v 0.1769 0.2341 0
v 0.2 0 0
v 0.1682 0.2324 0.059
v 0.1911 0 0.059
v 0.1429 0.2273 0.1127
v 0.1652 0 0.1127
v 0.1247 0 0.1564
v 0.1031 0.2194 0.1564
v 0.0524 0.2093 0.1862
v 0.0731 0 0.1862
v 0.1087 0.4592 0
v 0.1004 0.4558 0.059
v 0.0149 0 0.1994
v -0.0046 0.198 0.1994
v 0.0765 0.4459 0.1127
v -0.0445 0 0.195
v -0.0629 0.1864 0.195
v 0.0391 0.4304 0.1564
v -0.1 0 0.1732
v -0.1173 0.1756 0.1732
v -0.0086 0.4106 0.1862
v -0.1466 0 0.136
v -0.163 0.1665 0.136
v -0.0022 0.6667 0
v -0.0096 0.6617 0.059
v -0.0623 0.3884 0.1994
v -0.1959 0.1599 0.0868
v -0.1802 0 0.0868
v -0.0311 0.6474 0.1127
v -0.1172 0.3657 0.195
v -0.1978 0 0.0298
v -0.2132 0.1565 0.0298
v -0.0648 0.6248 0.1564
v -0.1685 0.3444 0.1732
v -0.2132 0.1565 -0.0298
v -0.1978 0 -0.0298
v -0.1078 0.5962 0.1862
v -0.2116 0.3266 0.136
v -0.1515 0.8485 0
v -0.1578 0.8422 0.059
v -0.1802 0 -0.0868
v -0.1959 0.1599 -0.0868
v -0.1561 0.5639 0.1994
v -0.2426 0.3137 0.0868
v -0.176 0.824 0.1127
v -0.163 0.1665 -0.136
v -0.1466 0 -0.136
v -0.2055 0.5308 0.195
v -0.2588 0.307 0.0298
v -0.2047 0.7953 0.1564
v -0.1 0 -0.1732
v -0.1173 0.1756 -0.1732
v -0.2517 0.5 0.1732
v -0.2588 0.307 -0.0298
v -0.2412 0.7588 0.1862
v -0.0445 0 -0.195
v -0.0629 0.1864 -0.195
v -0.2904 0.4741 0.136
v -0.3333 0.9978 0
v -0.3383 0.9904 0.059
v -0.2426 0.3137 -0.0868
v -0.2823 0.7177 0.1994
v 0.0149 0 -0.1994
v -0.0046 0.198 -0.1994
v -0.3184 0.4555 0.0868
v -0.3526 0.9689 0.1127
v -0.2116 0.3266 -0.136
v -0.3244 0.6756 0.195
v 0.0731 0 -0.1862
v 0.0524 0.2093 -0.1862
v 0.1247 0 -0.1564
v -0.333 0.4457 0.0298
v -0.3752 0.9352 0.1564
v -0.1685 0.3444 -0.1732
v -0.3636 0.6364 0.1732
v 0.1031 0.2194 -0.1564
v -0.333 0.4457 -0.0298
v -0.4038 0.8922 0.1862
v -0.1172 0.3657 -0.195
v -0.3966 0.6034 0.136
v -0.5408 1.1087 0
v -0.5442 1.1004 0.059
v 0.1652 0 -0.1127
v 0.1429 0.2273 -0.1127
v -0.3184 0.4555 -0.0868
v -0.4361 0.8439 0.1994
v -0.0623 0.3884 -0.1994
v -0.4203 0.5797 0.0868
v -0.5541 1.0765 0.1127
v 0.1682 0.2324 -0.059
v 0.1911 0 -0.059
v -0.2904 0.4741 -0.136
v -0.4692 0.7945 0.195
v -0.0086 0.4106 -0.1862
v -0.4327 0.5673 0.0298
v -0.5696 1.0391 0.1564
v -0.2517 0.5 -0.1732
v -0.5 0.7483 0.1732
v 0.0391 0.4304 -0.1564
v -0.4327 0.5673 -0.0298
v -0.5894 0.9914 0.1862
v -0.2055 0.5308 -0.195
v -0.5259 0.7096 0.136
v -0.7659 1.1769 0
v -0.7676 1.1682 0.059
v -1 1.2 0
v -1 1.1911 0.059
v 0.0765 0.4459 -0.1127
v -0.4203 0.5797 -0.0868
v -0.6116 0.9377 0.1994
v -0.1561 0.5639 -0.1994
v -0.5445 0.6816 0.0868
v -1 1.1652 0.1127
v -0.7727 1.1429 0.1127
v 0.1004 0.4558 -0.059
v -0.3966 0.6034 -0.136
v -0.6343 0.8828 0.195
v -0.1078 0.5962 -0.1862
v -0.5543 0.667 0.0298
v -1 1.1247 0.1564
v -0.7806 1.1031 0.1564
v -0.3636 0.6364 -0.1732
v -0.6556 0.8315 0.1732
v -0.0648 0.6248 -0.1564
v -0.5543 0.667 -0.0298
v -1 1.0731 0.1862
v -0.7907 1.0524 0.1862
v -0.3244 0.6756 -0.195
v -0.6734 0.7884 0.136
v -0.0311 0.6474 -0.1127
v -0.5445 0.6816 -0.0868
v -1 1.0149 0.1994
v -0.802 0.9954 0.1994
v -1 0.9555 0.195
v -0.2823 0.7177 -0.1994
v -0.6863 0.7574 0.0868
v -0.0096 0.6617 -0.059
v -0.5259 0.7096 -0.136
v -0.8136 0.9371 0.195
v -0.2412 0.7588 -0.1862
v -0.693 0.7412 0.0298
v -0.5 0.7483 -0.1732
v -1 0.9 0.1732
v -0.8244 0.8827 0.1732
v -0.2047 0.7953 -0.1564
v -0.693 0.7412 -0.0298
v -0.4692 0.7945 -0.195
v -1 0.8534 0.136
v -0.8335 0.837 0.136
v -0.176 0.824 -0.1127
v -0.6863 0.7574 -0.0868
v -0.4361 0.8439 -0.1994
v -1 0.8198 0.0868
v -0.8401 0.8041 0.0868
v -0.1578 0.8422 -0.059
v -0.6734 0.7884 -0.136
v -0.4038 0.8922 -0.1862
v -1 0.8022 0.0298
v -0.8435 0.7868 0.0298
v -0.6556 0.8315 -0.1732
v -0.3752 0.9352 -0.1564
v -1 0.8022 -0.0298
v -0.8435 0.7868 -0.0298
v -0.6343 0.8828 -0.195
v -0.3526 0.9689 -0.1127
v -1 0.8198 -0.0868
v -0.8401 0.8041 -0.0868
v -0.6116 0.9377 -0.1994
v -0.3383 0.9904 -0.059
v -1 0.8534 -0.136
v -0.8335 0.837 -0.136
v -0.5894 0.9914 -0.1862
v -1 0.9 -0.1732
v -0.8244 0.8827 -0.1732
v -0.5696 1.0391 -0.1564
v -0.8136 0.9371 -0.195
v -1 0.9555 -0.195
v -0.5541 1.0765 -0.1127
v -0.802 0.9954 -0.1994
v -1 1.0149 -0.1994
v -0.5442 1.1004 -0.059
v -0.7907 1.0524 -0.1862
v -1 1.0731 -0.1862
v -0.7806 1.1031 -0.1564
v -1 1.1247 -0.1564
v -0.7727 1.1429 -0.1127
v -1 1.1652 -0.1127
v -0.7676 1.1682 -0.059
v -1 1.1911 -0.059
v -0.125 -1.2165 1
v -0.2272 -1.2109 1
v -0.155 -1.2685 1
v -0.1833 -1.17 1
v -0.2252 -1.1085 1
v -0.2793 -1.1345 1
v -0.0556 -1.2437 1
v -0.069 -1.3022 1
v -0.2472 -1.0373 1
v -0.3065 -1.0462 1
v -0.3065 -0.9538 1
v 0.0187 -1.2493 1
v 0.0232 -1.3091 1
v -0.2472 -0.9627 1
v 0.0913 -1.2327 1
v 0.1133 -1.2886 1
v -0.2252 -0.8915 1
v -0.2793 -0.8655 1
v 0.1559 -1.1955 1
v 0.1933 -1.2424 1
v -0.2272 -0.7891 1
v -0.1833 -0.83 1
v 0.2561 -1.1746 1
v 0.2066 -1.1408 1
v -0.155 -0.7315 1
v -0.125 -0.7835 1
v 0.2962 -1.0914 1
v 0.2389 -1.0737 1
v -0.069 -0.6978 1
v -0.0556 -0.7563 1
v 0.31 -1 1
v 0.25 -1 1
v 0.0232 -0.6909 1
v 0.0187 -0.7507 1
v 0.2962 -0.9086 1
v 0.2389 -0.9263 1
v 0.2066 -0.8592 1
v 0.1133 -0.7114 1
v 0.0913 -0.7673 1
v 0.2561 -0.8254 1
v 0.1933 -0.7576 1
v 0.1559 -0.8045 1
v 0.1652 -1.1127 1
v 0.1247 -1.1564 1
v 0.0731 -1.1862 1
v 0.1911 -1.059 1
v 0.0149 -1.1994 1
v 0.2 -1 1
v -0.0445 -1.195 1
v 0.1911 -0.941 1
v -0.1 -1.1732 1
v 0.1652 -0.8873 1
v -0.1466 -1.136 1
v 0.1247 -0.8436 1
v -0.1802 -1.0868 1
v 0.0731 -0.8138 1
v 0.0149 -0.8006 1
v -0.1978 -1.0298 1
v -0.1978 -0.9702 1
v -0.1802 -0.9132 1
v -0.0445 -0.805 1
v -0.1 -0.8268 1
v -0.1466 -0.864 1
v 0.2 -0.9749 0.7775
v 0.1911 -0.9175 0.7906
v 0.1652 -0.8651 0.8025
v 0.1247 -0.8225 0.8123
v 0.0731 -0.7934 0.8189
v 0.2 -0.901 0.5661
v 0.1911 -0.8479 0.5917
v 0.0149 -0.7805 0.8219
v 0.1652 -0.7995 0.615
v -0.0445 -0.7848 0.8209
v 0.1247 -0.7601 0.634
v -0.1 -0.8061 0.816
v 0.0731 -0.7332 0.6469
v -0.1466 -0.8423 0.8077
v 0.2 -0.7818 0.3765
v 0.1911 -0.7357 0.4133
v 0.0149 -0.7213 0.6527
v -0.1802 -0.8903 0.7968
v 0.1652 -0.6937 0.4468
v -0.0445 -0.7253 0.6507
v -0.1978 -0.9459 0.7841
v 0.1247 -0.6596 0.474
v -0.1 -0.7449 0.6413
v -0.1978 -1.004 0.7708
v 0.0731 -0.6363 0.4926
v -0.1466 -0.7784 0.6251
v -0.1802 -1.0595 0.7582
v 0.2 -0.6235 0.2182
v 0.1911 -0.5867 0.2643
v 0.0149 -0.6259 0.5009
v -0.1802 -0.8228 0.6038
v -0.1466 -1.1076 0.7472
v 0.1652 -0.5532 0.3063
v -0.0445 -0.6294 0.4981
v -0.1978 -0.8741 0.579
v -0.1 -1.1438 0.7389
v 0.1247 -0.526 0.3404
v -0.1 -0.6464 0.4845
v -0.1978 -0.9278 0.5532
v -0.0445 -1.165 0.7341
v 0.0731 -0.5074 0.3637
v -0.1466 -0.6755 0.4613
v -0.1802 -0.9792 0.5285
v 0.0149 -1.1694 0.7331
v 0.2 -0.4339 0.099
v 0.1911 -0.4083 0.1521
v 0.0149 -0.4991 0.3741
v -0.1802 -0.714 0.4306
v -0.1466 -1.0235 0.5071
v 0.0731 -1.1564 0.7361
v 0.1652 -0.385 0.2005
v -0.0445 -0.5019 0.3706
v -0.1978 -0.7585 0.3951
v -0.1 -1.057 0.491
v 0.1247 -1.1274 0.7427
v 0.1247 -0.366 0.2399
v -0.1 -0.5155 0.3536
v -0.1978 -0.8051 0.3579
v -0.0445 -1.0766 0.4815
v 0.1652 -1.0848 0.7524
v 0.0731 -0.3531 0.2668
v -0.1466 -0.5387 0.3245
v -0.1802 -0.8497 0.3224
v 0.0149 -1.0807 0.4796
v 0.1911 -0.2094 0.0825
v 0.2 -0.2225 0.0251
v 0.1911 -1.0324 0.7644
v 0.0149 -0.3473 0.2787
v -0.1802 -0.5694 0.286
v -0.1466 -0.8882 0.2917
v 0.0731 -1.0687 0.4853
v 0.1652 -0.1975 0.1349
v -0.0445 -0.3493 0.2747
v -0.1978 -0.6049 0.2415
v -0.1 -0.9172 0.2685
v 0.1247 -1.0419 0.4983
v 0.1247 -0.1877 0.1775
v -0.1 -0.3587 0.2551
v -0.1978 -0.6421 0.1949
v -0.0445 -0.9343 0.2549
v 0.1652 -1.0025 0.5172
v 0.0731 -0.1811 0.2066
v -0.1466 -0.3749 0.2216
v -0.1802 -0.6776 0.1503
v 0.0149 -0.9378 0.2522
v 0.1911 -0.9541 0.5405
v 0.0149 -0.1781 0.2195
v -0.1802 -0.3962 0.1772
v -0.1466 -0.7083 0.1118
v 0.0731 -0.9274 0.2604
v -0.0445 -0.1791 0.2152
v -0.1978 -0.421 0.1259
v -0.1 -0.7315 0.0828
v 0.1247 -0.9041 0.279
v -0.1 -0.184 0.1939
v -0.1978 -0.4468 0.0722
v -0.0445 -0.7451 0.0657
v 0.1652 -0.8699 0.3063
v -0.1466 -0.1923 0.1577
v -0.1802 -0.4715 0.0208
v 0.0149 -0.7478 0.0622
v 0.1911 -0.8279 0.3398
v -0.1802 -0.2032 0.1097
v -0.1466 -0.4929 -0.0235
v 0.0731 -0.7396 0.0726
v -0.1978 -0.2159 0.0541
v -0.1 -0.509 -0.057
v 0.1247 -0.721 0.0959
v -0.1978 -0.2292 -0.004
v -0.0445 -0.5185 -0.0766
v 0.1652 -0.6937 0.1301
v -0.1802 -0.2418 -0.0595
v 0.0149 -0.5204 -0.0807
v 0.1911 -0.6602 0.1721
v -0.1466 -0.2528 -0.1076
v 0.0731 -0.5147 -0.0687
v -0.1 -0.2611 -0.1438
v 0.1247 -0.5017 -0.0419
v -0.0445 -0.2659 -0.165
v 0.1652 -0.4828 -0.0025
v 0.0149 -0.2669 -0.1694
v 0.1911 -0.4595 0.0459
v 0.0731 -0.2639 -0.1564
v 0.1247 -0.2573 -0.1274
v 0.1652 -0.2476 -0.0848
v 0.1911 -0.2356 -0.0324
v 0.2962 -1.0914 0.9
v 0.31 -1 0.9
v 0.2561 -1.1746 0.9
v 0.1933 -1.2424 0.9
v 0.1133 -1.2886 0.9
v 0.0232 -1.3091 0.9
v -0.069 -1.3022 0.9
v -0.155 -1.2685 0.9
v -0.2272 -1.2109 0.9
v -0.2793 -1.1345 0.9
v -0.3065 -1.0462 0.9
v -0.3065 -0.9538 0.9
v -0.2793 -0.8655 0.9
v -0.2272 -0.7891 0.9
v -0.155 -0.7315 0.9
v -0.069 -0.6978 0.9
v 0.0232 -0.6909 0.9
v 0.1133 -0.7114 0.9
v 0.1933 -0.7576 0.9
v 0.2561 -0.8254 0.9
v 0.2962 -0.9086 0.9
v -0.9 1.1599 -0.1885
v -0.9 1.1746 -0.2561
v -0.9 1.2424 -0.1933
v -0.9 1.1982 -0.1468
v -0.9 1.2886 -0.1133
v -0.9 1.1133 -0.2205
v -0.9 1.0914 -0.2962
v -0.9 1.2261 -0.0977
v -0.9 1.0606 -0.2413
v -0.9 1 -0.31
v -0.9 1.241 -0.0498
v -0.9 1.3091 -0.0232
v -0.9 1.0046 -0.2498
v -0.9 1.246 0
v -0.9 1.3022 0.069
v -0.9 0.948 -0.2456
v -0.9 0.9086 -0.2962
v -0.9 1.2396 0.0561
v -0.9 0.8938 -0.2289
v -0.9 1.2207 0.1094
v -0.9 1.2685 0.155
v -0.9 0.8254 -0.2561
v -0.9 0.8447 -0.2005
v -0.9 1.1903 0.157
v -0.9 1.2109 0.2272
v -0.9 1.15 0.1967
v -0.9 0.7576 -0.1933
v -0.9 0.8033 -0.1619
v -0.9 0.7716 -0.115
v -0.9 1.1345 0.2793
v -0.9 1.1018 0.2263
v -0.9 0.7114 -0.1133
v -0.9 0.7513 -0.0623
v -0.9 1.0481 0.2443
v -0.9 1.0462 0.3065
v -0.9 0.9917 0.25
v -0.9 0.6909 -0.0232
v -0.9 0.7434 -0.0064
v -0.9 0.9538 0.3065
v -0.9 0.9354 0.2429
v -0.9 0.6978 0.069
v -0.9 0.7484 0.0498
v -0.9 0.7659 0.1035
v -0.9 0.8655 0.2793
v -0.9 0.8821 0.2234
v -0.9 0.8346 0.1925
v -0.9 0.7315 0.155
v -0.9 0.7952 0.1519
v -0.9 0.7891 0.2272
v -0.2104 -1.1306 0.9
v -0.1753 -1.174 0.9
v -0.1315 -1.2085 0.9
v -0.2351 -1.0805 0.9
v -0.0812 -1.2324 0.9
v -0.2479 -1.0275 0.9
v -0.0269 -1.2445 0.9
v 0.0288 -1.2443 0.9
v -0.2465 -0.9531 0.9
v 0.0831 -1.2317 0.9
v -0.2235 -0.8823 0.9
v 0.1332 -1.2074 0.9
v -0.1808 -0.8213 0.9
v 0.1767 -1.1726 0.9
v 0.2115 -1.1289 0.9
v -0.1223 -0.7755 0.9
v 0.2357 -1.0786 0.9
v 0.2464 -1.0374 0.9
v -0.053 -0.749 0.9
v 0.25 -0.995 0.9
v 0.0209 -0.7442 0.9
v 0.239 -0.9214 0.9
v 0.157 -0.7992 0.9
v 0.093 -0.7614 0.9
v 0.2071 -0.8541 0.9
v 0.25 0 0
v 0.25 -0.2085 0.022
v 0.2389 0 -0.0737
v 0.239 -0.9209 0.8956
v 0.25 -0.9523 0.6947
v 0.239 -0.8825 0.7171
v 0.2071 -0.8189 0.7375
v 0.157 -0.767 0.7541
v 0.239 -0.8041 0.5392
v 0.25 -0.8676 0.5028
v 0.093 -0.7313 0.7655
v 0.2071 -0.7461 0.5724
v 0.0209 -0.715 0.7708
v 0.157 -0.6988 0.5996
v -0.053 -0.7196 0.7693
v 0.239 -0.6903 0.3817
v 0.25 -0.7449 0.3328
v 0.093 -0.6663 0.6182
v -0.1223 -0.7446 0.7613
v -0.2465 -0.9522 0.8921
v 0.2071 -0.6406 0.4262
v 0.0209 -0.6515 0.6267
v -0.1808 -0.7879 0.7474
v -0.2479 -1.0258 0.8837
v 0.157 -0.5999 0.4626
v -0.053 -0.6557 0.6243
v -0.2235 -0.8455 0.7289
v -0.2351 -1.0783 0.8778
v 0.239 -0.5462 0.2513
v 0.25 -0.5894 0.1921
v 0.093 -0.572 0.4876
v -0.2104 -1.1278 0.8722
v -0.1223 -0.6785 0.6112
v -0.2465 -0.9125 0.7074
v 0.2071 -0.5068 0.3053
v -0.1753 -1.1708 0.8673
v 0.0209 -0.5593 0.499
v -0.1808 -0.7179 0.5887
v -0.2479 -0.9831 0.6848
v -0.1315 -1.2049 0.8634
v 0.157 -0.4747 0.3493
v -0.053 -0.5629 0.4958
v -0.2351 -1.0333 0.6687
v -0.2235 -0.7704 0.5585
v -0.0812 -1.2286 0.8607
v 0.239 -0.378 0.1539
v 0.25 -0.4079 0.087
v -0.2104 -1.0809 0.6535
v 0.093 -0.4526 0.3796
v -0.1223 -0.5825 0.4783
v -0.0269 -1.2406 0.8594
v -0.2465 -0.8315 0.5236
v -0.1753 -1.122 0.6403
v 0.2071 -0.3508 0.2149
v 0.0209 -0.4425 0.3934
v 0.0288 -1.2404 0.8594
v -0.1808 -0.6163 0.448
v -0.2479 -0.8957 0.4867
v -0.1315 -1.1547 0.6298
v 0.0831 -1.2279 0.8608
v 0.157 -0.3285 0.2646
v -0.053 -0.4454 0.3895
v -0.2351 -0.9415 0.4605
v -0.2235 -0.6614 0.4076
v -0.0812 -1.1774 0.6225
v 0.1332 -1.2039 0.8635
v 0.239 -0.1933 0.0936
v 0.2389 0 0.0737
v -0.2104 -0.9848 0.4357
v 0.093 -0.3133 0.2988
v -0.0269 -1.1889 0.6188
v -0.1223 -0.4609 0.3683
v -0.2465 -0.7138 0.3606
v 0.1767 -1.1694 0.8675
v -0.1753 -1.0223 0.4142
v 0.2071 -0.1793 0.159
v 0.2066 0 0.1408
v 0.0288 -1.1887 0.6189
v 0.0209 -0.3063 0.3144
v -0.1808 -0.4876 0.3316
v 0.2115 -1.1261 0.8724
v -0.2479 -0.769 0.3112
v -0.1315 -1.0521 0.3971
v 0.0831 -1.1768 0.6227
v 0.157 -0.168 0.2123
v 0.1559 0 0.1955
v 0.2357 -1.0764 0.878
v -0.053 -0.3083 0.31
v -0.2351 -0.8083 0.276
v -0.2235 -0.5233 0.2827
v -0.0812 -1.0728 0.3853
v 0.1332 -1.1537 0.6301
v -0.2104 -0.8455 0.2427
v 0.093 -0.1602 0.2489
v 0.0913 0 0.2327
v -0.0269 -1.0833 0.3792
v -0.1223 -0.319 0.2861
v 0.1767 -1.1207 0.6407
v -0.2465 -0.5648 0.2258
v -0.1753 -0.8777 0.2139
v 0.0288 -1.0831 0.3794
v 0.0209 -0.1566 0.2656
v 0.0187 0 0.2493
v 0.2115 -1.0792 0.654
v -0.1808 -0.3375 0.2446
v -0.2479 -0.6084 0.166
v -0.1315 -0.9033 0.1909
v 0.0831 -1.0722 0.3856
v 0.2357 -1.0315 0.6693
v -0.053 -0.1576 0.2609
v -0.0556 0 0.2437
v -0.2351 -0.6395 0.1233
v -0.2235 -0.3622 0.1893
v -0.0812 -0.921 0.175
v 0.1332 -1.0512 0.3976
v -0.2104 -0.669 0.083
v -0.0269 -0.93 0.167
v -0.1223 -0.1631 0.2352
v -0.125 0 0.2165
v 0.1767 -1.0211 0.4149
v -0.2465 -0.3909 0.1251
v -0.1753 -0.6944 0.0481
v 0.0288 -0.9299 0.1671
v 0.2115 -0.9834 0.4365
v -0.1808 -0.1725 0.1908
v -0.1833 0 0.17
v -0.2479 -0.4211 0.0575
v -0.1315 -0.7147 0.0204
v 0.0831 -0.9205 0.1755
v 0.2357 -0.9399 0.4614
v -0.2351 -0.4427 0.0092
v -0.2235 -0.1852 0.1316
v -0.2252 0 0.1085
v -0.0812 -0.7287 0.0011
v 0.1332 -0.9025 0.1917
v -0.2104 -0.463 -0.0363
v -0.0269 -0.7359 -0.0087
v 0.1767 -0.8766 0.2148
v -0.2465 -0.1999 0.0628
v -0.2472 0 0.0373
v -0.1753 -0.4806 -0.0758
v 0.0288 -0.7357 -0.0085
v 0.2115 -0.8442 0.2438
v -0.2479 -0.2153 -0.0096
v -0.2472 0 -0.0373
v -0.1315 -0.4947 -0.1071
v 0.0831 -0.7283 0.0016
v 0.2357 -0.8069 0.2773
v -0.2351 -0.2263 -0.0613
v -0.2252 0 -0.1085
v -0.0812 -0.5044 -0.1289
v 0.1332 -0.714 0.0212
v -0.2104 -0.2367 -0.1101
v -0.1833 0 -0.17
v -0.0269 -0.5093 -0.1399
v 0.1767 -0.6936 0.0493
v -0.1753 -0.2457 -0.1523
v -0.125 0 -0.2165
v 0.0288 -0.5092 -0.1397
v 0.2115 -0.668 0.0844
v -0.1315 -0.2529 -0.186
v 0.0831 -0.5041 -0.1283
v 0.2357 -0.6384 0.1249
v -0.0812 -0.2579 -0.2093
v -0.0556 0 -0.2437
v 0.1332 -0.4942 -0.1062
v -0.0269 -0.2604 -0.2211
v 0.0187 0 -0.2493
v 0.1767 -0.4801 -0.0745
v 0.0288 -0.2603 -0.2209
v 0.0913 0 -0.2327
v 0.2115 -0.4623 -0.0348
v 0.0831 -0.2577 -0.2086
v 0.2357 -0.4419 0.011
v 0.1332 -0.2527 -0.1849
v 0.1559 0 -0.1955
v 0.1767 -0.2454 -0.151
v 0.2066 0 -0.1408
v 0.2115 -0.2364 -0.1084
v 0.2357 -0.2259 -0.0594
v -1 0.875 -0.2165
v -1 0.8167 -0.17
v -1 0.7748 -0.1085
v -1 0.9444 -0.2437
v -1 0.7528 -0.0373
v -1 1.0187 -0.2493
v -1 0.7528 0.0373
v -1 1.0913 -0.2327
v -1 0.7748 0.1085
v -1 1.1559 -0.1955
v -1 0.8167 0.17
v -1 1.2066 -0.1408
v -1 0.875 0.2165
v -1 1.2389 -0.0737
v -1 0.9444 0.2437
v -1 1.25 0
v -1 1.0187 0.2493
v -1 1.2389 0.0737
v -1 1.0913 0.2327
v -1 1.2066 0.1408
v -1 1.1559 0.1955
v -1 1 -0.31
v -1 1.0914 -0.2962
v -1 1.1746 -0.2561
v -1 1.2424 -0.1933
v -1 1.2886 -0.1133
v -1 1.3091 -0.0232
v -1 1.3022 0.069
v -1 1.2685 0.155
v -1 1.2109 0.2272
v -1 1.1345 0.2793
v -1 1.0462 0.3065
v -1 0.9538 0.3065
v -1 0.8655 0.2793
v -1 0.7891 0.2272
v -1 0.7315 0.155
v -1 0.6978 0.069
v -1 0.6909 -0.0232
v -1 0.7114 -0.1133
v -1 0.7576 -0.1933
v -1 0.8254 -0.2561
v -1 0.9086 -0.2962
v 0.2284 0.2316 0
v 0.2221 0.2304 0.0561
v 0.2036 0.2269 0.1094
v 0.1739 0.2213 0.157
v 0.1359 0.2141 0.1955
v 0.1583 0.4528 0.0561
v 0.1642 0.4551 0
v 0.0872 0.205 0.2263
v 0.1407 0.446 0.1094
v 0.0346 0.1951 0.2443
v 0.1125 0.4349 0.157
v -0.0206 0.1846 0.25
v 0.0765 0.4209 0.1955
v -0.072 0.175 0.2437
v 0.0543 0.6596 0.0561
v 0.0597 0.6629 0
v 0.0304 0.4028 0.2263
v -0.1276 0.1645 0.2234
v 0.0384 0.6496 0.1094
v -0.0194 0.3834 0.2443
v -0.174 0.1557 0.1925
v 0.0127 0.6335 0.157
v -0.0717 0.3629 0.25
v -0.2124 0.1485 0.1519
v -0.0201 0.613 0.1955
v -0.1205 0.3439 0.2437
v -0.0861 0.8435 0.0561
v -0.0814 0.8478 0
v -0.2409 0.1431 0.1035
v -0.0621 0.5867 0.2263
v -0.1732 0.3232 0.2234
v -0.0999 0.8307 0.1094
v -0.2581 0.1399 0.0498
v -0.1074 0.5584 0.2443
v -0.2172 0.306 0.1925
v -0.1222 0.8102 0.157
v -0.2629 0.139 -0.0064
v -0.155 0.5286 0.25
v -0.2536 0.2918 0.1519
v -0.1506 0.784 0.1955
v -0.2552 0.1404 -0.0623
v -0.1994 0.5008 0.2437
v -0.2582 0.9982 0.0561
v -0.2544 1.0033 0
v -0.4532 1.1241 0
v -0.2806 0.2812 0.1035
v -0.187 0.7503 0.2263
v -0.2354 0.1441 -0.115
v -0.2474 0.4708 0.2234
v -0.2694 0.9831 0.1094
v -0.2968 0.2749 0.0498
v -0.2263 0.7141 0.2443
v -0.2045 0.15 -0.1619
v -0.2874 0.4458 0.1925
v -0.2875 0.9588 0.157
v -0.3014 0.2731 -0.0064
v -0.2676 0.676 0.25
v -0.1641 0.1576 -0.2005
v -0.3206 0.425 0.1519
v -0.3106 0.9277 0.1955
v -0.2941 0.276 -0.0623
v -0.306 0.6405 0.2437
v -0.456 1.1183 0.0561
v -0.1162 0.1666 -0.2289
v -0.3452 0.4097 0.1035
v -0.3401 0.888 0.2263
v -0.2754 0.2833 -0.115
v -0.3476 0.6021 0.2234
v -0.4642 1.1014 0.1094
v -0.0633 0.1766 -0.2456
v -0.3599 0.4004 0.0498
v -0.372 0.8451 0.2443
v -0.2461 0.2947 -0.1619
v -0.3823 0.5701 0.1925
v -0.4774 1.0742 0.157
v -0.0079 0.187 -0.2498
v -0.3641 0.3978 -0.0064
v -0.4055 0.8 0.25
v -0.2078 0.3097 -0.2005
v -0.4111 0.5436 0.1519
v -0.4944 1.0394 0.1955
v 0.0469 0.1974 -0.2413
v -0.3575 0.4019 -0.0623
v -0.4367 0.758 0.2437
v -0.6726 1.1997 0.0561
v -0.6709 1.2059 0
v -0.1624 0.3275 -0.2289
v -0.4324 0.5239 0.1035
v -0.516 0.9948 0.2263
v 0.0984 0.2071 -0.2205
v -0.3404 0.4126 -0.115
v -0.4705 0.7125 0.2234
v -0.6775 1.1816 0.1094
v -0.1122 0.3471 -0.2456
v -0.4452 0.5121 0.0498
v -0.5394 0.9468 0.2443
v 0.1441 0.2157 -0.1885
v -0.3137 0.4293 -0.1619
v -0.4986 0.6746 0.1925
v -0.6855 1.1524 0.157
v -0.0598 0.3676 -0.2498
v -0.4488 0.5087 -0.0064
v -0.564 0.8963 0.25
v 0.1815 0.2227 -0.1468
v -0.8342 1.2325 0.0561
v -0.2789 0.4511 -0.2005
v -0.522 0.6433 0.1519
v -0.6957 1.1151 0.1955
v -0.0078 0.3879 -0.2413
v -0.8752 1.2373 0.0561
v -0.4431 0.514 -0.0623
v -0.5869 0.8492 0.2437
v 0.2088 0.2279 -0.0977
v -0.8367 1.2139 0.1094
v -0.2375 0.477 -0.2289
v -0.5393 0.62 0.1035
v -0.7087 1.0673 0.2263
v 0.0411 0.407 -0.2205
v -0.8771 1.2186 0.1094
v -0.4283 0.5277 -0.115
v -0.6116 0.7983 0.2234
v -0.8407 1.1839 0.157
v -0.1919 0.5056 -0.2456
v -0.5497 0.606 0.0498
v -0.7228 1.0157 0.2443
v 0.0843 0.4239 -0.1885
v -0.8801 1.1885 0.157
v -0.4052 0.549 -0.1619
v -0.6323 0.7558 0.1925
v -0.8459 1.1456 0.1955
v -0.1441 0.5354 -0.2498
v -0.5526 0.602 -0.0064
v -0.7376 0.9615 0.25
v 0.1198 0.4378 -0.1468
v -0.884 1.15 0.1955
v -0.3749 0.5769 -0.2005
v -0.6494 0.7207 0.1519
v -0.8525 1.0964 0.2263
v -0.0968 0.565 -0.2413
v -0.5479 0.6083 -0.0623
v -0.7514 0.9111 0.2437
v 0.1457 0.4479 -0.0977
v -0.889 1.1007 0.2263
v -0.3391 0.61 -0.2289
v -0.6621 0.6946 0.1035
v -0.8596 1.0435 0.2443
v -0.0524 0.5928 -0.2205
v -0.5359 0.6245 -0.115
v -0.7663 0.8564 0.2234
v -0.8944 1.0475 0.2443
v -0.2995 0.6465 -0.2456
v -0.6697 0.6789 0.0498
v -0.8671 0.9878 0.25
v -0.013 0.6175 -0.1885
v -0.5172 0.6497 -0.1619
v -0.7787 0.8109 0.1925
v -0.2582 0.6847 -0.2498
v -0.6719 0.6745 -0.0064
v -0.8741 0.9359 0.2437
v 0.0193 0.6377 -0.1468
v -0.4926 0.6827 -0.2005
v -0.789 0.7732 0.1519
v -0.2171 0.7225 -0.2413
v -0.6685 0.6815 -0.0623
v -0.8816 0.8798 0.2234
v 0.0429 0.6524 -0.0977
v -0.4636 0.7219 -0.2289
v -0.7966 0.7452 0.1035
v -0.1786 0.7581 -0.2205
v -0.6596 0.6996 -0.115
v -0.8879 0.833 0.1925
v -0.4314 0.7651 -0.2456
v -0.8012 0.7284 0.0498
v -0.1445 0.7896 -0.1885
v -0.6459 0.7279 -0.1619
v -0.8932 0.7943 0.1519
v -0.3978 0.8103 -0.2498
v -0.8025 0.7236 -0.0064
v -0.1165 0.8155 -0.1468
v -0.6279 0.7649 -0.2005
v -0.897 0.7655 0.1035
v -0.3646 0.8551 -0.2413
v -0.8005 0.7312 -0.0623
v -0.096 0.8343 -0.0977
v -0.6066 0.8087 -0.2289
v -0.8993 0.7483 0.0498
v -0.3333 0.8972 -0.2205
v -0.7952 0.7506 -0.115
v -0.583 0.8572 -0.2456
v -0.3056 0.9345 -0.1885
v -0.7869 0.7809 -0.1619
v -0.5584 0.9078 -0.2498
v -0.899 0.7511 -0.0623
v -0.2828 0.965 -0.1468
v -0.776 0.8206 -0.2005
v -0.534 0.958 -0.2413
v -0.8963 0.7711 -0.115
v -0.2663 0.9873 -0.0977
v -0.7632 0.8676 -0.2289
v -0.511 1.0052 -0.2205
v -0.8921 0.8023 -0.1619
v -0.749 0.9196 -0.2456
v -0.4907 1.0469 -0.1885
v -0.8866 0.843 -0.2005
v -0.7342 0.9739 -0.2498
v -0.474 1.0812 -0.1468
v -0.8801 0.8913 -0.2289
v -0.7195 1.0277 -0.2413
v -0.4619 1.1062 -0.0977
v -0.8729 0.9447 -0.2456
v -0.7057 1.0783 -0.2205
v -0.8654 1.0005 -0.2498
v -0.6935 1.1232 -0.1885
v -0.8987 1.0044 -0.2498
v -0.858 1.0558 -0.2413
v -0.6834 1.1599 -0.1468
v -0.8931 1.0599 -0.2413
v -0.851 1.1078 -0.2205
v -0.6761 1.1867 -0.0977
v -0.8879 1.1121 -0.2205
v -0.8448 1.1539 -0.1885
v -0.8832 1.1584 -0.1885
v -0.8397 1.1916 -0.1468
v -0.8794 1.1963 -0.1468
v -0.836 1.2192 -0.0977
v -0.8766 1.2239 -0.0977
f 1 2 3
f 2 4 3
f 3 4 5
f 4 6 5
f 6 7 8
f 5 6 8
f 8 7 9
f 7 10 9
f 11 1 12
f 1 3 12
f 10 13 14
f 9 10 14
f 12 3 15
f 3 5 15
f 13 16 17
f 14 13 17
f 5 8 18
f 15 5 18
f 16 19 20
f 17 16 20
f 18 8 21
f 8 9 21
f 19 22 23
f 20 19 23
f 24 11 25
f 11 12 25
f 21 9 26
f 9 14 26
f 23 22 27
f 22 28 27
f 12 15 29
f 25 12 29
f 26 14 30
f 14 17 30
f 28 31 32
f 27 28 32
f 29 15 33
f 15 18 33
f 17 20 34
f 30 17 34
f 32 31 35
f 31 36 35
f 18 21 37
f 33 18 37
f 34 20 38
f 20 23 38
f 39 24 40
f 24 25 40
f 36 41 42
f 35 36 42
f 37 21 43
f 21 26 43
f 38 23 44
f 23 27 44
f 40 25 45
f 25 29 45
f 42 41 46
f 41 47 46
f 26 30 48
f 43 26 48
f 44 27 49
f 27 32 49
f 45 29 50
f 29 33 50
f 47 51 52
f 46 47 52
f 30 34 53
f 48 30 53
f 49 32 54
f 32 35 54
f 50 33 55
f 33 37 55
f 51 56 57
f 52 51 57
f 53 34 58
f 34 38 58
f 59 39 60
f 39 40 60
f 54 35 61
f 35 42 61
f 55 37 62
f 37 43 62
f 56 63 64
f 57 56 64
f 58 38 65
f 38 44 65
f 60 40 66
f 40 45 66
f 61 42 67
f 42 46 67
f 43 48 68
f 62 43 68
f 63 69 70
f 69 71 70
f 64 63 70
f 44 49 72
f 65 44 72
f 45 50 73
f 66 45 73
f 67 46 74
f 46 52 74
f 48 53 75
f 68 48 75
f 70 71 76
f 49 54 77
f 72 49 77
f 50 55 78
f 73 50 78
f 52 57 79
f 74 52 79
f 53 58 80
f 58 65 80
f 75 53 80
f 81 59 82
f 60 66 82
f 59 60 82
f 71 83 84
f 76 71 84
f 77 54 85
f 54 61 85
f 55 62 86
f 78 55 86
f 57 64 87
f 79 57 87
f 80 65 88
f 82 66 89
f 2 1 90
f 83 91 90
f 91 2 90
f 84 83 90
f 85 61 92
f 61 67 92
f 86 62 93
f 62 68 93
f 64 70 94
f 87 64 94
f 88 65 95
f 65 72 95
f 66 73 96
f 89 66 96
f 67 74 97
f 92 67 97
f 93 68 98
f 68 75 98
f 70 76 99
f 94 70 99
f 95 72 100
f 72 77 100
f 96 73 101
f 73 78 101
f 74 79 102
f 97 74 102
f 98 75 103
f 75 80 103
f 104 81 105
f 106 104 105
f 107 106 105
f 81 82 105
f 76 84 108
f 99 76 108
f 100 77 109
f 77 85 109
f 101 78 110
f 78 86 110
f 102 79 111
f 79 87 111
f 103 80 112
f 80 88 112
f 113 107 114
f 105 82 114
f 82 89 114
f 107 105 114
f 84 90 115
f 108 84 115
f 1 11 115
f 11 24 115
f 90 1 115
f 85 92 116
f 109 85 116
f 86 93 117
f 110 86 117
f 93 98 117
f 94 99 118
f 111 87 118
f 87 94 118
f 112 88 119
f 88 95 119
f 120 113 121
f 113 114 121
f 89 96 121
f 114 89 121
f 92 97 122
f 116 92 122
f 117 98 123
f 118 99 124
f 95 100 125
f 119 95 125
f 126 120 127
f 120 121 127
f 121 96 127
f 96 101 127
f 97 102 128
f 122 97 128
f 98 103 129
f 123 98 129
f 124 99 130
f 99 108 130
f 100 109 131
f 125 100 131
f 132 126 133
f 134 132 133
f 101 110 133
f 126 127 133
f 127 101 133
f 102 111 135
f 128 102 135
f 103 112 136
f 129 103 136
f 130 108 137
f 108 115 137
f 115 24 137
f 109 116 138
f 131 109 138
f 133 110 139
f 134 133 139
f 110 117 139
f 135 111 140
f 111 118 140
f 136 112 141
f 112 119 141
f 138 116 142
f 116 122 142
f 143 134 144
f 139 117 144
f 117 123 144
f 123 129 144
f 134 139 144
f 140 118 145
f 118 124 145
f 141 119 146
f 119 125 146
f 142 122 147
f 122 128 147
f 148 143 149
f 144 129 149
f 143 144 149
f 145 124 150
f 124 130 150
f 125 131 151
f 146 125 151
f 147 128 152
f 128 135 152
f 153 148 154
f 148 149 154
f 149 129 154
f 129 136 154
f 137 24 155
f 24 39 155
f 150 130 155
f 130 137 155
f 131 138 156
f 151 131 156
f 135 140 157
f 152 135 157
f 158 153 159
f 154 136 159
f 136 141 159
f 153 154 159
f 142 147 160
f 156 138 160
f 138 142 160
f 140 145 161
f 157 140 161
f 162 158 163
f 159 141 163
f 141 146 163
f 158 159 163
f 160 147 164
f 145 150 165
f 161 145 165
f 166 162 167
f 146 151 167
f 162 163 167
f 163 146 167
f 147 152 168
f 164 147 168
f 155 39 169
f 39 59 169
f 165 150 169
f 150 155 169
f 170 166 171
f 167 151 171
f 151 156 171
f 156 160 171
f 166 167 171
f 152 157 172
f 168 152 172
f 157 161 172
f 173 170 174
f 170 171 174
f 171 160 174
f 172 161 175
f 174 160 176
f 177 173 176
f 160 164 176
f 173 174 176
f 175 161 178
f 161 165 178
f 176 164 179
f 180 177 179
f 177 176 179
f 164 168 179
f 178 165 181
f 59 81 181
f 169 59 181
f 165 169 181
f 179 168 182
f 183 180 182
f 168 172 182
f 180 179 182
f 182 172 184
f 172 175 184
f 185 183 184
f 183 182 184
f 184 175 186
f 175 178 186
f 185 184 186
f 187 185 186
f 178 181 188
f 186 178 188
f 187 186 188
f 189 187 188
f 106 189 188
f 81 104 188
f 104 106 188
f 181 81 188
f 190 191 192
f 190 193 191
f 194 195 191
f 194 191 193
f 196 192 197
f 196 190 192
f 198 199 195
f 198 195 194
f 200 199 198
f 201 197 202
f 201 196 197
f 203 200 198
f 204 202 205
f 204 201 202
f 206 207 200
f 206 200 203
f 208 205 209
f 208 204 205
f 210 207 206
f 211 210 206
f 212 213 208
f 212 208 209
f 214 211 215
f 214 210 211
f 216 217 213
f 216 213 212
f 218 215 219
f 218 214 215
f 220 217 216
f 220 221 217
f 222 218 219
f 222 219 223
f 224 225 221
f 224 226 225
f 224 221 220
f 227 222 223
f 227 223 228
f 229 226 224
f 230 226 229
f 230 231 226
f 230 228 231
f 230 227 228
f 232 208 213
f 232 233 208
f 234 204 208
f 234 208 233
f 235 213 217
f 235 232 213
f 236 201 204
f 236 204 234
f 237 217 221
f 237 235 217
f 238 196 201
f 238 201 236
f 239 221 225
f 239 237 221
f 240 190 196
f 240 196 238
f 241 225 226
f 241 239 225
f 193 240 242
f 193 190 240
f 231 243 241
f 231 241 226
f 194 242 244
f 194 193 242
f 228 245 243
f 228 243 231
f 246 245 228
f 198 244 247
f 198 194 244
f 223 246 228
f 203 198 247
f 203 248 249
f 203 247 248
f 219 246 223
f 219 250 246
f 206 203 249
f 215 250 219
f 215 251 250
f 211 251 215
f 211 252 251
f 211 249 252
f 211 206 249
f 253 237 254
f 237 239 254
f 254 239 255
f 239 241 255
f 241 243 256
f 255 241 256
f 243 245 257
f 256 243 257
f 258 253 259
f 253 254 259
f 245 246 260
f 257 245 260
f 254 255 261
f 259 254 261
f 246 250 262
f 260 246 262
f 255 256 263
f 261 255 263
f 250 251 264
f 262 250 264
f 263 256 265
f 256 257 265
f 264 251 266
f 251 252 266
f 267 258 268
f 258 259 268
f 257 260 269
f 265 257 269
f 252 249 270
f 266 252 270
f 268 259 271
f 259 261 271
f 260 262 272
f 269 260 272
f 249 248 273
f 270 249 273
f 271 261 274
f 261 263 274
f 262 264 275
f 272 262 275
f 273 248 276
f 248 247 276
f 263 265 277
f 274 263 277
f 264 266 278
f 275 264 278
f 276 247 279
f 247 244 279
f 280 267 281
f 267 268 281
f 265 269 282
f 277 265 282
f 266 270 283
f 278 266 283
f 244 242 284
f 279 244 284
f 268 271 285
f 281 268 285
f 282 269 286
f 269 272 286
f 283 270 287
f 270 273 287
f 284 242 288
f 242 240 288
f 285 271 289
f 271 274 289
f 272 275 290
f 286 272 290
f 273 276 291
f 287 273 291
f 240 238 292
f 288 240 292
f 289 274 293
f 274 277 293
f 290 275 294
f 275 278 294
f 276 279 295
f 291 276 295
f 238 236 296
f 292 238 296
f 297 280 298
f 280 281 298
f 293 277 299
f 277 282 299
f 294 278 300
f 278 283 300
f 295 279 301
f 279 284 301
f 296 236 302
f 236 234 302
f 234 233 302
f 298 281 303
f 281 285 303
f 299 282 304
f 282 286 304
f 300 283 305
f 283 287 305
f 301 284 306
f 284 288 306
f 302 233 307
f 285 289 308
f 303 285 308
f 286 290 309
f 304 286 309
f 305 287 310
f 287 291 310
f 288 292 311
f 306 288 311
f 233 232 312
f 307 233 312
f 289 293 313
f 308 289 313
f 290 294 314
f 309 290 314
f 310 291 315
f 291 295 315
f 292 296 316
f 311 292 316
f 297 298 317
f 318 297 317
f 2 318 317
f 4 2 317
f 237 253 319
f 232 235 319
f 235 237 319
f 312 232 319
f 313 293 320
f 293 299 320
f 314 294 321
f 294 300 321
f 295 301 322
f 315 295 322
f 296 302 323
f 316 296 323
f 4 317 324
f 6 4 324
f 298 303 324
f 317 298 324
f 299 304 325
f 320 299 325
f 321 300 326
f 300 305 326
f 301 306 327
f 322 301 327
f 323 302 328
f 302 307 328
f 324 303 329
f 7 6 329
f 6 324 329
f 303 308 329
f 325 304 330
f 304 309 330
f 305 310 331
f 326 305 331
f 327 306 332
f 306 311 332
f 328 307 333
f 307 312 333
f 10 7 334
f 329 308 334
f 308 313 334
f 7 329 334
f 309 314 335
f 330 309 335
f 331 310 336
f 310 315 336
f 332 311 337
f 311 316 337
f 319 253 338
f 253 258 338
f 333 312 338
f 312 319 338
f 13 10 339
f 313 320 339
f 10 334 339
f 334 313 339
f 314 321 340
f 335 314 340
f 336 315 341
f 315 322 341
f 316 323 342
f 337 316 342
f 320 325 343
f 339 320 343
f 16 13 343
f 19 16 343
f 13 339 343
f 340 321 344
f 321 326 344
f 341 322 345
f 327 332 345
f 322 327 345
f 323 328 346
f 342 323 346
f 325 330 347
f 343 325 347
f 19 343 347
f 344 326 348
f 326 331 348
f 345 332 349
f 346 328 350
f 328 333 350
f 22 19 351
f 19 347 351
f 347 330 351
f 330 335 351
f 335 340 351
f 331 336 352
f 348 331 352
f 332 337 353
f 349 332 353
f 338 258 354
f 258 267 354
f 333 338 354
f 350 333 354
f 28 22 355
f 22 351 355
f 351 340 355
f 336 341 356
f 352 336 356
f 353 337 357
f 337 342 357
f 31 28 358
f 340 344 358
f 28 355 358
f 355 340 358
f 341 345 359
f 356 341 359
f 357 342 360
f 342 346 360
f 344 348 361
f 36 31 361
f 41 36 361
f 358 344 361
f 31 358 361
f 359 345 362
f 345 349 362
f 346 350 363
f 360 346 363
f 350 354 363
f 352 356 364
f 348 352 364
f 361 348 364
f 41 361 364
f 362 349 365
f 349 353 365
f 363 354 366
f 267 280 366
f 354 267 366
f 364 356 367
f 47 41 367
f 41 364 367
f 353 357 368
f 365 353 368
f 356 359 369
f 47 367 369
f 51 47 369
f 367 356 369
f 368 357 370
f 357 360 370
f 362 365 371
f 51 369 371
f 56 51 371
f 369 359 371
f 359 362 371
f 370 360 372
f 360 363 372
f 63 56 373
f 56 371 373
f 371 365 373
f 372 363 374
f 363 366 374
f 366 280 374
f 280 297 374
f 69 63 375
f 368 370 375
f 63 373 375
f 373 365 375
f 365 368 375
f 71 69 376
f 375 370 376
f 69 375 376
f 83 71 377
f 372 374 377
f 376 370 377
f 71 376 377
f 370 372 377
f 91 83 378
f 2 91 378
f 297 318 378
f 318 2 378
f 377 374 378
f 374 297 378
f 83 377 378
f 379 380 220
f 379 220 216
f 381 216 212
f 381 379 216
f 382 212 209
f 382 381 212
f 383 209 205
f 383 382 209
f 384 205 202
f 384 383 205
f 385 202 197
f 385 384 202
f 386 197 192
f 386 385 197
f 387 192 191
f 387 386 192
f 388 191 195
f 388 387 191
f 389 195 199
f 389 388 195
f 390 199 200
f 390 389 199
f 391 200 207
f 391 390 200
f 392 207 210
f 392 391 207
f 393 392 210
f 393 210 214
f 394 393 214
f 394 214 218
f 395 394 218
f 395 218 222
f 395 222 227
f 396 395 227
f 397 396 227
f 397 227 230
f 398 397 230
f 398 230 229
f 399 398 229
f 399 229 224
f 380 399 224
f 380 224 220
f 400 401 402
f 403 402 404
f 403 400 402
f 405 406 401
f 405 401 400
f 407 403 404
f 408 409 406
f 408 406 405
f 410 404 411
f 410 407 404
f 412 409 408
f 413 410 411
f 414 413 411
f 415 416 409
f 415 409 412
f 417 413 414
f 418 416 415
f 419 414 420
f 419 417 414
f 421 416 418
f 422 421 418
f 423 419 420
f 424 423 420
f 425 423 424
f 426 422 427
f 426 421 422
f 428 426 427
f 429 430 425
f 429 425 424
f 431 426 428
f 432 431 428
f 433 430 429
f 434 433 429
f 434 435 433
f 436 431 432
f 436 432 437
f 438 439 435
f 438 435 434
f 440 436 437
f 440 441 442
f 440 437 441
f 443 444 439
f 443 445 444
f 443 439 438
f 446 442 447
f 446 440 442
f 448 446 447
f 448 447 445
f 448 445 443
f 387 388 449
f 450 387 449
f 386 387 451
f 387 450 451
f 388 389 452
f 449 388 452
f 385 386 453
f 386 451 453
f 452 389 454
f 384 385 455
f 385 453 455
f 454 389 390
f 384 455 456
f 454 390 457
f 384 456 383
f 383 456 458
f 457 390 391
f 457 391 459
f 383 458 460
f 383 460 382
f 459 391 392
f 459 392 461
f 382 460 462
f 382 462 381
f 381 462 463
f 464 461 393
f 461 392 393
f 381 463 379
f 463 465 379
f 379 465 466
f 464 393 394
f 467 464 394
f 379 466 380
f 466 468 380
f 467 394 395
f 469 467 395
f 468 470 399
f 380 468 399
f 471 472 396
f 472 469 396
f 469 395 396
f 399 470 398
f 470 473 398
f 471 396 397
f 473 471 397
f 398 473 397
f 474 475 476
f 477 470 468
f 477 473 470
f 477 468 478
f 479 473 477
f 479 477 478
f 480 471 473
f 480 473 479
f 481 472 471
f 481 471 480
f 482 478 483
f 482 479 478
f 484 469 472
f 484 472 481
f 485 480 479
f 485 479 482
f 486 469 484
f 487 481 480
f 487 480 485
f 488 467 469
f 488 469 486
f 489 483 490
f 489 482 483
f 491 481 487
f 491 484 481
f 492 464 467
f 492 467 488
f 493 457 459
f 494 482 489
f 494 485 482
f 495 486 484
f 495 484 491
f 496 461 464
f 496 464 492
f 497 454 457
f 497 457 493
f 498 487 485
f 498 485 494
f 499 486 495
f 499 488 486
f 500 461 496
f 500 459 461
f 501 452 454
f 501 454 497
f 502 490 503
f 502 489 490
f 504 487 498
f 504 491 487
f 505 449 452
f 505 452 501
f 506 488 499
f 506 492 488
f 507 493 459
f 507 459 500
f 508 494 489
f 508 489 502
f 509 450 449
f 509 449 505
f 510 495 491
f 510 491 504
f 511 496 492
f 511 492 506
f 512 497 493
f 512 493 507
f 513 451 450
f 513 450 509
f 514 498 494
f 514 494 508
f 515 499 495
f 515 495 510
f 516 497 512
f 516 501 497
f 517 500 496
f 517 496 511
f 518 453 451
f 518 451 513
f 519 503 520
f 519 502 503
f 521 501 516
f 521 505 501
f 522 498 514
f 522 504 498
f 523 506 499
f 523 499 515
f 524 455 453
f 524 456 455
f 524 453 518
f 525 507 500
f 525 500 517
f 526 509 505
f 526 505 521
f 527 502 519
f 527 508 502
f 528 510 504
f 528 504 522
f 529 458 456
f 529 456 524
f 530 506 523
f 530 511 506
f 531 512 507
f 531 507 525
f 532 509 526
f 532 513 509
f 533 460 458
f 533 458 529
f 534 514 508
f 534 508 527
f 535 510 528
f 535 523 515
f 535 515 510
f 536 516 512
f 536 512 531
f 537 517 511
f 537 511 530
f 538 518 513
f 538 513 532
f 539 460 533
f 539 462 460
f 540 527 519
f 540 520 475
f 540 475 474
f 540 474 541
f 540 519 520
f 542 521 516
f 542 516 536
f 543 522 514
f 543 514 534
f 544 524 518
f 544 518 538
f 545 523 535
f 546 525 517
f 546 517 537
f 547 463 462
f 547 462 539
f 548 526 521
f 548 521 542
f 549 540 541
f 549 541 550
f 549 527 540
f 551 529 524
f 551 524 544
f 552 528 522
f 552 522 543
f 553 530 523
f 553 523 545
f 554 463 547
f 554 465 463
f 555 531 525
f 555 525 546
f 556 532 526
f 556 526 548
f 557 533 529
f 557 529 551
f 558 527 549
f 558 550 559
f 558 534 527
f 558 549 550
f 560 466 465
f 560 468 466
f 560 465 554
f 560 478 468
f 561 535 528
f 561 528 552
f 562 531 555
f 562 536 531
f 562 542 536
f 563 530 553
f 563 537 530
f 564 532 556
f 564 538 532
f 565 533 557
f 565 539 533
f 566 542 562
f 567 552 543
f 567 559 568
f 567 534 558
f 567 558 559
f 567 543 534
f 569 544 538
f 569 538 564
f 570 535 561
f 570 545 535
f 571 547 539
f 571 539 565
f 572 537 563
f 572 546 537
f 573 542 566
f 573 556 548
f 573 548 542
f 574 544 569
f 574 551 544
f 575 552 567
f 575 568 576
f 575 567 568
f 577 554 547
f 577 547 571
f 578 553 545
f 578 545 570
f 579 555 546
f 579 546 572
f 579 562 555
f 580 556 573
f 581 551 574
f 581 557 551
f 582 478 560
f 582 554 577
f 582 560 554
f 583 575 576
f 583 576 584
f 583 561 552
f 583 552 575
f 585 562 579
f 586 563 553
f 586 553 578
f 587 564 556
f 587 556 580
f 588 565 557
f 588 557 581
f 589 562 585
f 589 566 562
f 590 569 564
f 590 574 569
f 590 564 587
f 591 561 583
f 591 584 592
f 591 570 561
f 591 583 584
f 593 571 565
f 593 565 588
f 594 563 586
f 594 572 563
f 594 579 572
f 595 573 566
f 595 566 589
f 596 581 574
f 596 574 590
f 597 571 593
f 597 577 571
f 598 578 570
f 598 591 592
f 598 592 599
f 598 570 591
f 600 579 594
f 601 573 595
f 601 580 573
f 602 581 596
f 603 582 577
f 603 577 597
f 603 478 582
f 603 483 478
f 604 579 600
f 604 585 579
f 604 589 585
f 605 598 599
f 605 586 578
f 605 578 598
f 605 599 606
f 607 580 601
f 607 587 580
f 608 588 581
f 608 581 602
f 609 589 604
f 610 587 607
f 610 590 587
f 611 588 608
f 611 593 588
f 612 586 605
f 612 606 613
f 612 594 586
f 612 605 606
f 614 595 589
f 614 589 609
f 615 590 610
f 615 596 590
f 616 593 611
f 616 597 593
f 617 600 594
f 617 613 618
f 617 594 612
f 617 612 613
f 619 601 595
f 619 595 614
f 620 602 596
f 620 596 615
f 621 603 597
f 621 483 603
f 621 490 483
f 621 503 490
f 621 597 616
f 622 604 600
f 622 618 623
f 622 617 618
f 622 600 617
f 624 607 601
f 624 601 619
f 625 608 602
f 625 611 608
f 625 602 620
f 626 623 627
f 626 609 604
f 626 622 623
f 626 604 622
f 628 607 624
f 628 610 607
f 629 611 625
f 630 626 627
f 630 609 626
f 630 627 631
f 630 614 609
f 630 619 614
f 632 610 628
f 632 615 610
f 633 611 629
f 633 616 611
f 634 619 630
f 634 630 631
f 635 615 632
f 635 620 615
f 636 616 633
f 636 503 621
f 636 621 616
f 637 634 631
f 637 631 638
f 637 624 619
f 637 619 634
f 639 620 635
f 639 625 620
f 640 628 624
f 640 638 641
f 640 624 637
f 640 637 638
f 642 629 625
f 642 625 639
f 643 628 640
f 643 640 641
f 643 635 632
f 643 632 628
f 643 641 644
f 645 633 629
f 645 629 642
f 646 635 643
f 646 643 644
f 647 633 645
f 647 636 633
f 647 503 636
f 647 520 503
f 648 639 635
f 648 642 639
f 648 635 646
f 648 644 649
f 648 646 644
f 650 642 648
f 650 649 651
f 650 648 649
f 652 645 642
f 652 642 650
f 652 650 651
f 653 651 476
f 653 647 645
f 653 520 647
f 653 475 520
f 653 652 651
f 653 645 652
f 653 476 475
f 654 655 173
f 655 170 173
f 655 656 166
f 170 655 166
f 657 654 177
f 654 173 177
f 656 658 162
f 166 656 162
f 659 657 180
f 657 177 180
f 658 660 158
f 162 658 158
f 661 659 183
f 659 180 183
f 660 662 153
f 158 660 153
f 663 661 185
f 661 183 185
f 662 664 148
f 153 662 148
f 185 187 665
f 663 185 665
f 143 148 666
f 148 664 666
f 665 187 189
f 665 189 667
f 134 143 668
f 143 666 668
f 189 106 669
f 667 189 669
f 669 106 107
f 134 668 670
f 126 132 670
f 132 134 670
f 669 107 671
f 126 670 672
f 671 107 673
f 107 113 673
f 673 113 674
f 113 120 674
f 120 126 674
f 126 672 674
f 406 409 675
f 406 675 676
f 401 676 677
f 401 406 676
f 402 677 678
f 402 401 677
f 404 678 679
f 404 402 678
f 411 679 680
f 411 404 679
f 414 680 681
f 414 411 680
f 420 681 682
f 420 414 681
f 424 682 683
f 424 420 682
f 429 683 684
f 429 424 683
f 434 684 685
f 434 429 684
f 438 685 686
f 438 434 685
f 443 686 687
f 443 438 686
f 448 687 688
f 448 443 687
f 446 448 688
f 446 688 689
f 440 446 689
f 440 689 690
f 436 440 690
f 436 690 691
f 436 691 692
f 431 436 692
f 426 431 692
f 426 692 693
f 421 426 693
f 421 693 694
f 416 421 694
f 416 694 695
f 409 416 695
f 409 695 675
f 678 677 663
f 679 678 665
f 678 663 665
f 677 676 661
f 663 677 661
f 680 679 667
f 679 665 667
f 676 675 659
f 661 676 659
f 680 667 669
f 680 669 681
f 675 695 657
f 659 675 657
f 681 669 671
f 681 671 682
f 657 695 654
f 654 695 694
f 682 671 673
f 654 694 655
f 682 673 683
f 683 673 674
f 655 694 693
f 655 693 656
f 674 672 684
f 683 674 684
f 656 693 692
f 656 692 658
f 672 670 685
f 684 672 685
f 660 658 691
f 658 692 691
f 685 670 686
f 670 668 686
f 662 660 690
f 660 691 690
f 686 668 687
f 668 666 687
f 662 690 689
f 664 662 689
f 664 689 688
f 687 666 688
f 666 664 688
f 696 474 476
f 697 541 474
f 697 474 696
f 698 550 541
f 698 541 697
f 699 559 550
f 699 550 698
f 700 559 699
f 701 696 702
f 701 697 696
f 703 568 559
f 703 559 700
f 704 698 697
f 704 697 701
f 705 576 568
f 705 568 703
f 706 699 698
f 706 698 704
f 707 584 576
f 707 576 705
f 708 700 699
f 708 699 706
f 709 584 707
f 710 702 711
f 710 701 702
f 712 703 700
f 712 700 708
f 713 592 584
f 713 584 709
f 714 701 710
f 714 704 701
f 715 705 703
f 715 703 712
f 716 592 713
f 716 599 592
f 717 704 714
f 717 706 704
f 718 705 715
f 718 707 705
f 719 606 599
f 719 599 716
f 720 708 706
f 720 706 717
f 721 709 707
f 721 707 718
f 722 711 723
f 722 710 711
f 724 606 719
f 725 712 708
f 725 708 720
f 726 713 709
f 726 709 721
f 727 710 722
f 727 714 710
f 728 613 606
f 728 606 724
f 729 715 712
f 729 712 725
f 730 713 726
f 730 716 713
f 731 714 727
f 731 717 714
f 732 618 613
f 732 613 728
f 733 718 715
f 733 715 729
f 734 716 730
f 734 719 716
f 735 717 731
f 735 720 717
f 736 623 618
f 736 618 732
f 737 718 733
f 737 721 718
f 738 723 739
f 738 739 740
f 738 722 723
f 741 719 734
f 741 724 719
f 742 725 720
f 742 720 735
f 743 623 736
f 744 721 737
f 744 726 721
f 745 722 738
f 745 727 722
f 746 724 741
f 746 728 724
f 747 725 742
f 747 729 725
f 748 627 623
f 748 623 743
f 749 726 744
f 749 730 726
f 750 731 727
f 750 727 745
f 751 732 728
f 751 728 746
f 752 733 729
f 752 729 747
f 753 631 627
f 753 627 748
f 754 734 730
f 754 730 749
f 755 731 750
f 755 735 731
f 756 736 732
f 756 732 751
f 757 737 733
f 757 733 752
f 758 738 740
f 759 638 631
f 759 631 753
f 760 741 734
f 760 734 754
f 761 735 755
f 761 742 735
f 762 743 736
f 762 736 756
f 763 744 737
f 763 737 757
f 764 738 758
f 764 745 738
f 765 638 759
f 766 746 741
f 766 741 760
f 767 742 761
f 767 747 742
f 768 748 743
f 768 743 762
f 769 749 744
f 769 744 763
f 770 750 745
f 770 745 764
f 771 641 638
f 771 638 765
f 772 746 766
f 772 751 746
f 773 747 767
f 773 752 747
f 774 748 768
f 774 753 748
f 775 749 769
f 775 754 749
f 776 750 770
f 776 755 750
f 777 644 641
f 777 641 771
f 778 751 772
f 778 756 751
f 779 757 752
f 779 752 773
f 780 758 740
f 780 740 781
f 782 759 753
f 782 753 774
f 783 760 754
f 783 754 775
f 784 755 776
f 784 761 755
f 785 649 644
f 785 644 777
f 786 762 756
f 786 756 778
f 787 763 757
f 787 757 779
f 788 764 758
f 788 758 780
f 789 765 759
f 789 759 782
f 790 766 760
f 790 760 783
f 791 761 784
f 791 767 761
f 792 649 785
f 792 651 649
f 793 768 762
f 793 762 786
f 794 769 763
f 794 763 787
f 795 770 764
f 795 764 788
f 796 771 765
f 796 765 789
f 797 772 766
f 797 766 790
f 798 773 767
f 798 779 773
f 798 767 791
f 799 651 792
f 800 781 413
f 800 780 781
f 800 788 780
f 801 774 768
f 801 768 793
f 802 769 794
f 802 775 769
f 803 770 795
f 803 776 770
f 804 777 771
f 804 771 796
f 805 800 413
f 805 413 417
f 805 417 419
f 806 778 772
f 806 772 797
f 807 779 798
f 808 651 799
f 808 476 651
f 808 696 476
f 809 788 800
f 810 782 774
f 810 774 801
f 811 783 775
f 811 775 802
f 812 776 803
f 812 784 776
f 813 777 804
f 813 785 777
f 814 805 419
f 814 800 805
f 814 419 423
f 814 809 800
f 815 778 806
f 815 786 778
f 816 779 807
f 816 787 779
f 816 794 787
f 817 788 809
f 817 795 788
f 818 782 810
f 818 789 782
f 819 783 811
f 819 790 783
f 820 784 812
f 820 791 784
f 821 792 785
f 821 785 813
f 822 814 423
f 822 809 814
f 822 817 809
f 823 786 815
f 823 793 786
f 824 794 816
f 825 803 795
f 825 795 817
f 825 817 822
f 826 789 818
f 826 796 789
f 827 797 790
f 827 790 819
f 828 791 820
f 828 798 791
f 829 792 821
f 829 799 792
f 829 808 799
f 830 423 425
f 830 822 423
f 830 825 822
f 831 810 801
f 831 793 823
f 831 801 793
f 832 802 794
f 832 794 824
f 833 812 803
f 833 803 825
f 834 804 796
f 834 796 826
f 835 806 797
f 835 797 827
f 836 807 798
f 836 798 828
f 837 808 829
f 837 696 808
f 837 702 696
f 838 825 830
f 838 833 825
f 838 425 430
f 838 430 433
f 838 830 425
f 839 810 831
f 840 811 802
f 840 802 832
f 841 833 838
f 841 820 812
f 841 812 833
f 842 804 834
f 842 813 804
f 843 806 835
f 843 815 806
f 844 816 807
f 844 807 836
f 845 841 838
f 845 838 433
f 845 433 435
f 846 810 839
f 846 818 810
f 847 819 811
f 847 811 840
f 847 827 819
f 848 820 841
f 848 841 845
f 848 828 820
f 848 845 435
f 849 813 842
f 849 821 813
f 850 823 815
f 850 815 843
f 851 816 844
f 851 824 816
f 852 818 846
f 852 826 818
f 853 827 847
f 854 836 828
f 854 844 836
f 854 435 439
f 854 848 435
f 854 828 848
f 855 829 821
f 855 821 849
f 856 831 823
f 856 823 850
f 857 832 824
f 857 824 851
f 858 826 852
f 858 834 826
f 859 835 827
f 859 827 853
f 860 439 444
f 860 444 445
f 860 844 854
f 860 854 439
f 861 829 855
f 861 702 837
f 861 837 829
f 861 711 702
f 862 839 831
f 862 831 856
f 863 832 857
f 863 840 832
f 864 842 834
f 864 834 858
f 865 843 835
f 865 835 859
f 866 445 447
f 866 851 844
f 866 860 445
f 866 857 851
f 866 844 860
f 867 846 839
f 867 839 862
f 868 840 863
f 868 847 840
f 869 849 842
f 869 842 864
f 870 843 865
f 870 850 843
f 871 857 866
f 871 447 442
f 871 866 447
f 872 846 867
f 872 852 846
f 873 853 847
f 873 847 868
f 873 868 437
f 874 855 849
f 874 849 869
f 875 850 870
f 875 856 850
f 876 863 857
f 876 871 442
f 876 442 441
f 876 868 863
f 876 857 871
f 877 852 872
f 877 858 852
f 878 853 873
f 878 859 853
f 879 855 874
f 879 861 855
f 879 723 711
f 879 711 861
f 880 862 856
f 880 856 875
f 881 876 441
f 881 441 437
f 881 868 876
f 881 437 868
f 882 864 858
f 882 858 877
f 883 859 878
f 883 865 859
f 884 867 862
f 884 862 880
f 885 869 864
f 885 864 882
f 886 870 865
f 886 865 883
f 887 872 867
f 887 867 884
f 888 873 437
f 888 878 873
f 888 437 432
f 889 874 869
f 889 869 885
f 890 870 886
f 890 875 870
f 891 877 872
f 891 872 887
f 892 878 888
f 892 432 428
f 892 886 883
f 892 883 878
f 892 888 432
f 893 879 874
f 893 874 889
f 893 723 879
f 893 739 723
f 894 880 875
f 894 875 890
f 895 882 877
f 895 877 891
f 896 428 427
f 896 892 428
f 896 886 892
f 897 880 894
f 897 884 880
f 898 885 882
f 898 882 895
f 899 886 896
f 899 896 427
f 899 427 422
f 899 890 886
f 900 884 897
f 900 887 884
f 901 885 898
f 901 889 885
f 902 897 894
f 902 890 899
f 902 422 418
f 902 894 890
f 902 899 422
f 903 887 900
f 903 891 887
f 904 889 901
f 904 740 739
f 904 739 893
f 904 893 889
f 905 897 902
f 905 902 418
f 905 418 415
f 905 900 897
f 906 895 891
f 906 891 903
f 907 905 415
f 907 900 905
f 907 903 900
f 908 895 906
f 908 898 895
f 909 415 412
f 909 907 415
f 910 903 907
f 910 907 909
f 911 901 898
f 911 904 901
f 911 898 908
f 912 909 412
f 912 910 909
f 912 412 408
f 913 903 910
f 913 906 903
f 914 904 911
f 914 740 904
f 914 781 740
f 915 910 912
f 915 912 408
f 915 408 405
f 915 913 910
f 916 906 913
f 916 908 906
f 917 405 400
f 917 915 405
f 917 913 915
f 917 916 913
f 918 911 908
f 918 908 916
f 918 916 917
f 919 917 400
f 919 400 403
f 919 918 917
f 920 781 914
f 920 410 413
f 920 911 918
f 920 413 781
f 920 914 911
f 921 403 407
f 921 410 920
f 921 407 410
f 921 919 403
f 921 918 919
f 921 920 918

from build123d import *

# Parameters (mm, degrees)
IZIM4_R   = 0.25
IZIM4_R_2 = 0.2
IZIM5_R   = 0.31
IZIM5_R_2 = 0.21
IZIM6_R   = 0.31
IZIM6_R_2 = 0.21


with BuildPart() as part:
    # Süpür-İnce1: sweep along a curve in space
    with BuildLine() as s_p_r_nce1_path:
        ThreePointArc((0, 0, 0), (-0.292893219, 0.707106781, 0), (-1, 1, 0))
        ThreePointArc((0, 0, 0), (0, -0.707106781, 0.292893219), (0, -1, 1))
    # Çizim4 → Süpür-İnce1 (sweep)
    with BuildSketch(Plane.XY.offset(1)):
        with Locations((0, -1)):
            Circle(IZIM4_R)
        with Locations((0, -1)):
            Circle(IZIM4_R_2, mode=Mode.SUBTRACT)
    sweep(path=s_p_r_nce1_path.line)

    # Süpür-İnce2: sweep along a path in Çizim2
    with BuildLine(Plane(origin=(0, 0, 0), x_dir=(0, 0, -1), z_dir=(1, 0, 0))) as s_p_r_nce2_path:
        Line((-1, -1), (-0.9, -1))
    # Çizim5 → Süpür-İnce2 (sweep)
    with BuildSketch(Plane.XY.offset(1)):
        with Locations((0, -1)):
            Circle(IZIM5_R)
        with Locations((0, -1)):
            Circle(IZIM5_R_2, mode=Mode.SUBTRACT)
    sweep(path=s_p_r_nce2_path.line)

    # Süpür-İnce3: sweep along a path in Çizim3
    with BuildLine(Plane.XY) as s_p_r_nce3_path:
        Line((-1, 1), (-0.9, 1))
    # Çizim6 → Süpür-İnce3 (sweep)
    with BuildSketch(Plane(origin=(-1, 0, 0), x_dir=(0, 0, -1), z_dir=(1, 0, 0))):
        with Locations((0, 1)):
            Circle(IZIM6_R)
        with Locations((0, 1)):
            Circle(IZIM6_R_2, mode=Mode.SUBTRACT)
    sweep(path=s_p_r_nce3_path.line)


solid = part.part
